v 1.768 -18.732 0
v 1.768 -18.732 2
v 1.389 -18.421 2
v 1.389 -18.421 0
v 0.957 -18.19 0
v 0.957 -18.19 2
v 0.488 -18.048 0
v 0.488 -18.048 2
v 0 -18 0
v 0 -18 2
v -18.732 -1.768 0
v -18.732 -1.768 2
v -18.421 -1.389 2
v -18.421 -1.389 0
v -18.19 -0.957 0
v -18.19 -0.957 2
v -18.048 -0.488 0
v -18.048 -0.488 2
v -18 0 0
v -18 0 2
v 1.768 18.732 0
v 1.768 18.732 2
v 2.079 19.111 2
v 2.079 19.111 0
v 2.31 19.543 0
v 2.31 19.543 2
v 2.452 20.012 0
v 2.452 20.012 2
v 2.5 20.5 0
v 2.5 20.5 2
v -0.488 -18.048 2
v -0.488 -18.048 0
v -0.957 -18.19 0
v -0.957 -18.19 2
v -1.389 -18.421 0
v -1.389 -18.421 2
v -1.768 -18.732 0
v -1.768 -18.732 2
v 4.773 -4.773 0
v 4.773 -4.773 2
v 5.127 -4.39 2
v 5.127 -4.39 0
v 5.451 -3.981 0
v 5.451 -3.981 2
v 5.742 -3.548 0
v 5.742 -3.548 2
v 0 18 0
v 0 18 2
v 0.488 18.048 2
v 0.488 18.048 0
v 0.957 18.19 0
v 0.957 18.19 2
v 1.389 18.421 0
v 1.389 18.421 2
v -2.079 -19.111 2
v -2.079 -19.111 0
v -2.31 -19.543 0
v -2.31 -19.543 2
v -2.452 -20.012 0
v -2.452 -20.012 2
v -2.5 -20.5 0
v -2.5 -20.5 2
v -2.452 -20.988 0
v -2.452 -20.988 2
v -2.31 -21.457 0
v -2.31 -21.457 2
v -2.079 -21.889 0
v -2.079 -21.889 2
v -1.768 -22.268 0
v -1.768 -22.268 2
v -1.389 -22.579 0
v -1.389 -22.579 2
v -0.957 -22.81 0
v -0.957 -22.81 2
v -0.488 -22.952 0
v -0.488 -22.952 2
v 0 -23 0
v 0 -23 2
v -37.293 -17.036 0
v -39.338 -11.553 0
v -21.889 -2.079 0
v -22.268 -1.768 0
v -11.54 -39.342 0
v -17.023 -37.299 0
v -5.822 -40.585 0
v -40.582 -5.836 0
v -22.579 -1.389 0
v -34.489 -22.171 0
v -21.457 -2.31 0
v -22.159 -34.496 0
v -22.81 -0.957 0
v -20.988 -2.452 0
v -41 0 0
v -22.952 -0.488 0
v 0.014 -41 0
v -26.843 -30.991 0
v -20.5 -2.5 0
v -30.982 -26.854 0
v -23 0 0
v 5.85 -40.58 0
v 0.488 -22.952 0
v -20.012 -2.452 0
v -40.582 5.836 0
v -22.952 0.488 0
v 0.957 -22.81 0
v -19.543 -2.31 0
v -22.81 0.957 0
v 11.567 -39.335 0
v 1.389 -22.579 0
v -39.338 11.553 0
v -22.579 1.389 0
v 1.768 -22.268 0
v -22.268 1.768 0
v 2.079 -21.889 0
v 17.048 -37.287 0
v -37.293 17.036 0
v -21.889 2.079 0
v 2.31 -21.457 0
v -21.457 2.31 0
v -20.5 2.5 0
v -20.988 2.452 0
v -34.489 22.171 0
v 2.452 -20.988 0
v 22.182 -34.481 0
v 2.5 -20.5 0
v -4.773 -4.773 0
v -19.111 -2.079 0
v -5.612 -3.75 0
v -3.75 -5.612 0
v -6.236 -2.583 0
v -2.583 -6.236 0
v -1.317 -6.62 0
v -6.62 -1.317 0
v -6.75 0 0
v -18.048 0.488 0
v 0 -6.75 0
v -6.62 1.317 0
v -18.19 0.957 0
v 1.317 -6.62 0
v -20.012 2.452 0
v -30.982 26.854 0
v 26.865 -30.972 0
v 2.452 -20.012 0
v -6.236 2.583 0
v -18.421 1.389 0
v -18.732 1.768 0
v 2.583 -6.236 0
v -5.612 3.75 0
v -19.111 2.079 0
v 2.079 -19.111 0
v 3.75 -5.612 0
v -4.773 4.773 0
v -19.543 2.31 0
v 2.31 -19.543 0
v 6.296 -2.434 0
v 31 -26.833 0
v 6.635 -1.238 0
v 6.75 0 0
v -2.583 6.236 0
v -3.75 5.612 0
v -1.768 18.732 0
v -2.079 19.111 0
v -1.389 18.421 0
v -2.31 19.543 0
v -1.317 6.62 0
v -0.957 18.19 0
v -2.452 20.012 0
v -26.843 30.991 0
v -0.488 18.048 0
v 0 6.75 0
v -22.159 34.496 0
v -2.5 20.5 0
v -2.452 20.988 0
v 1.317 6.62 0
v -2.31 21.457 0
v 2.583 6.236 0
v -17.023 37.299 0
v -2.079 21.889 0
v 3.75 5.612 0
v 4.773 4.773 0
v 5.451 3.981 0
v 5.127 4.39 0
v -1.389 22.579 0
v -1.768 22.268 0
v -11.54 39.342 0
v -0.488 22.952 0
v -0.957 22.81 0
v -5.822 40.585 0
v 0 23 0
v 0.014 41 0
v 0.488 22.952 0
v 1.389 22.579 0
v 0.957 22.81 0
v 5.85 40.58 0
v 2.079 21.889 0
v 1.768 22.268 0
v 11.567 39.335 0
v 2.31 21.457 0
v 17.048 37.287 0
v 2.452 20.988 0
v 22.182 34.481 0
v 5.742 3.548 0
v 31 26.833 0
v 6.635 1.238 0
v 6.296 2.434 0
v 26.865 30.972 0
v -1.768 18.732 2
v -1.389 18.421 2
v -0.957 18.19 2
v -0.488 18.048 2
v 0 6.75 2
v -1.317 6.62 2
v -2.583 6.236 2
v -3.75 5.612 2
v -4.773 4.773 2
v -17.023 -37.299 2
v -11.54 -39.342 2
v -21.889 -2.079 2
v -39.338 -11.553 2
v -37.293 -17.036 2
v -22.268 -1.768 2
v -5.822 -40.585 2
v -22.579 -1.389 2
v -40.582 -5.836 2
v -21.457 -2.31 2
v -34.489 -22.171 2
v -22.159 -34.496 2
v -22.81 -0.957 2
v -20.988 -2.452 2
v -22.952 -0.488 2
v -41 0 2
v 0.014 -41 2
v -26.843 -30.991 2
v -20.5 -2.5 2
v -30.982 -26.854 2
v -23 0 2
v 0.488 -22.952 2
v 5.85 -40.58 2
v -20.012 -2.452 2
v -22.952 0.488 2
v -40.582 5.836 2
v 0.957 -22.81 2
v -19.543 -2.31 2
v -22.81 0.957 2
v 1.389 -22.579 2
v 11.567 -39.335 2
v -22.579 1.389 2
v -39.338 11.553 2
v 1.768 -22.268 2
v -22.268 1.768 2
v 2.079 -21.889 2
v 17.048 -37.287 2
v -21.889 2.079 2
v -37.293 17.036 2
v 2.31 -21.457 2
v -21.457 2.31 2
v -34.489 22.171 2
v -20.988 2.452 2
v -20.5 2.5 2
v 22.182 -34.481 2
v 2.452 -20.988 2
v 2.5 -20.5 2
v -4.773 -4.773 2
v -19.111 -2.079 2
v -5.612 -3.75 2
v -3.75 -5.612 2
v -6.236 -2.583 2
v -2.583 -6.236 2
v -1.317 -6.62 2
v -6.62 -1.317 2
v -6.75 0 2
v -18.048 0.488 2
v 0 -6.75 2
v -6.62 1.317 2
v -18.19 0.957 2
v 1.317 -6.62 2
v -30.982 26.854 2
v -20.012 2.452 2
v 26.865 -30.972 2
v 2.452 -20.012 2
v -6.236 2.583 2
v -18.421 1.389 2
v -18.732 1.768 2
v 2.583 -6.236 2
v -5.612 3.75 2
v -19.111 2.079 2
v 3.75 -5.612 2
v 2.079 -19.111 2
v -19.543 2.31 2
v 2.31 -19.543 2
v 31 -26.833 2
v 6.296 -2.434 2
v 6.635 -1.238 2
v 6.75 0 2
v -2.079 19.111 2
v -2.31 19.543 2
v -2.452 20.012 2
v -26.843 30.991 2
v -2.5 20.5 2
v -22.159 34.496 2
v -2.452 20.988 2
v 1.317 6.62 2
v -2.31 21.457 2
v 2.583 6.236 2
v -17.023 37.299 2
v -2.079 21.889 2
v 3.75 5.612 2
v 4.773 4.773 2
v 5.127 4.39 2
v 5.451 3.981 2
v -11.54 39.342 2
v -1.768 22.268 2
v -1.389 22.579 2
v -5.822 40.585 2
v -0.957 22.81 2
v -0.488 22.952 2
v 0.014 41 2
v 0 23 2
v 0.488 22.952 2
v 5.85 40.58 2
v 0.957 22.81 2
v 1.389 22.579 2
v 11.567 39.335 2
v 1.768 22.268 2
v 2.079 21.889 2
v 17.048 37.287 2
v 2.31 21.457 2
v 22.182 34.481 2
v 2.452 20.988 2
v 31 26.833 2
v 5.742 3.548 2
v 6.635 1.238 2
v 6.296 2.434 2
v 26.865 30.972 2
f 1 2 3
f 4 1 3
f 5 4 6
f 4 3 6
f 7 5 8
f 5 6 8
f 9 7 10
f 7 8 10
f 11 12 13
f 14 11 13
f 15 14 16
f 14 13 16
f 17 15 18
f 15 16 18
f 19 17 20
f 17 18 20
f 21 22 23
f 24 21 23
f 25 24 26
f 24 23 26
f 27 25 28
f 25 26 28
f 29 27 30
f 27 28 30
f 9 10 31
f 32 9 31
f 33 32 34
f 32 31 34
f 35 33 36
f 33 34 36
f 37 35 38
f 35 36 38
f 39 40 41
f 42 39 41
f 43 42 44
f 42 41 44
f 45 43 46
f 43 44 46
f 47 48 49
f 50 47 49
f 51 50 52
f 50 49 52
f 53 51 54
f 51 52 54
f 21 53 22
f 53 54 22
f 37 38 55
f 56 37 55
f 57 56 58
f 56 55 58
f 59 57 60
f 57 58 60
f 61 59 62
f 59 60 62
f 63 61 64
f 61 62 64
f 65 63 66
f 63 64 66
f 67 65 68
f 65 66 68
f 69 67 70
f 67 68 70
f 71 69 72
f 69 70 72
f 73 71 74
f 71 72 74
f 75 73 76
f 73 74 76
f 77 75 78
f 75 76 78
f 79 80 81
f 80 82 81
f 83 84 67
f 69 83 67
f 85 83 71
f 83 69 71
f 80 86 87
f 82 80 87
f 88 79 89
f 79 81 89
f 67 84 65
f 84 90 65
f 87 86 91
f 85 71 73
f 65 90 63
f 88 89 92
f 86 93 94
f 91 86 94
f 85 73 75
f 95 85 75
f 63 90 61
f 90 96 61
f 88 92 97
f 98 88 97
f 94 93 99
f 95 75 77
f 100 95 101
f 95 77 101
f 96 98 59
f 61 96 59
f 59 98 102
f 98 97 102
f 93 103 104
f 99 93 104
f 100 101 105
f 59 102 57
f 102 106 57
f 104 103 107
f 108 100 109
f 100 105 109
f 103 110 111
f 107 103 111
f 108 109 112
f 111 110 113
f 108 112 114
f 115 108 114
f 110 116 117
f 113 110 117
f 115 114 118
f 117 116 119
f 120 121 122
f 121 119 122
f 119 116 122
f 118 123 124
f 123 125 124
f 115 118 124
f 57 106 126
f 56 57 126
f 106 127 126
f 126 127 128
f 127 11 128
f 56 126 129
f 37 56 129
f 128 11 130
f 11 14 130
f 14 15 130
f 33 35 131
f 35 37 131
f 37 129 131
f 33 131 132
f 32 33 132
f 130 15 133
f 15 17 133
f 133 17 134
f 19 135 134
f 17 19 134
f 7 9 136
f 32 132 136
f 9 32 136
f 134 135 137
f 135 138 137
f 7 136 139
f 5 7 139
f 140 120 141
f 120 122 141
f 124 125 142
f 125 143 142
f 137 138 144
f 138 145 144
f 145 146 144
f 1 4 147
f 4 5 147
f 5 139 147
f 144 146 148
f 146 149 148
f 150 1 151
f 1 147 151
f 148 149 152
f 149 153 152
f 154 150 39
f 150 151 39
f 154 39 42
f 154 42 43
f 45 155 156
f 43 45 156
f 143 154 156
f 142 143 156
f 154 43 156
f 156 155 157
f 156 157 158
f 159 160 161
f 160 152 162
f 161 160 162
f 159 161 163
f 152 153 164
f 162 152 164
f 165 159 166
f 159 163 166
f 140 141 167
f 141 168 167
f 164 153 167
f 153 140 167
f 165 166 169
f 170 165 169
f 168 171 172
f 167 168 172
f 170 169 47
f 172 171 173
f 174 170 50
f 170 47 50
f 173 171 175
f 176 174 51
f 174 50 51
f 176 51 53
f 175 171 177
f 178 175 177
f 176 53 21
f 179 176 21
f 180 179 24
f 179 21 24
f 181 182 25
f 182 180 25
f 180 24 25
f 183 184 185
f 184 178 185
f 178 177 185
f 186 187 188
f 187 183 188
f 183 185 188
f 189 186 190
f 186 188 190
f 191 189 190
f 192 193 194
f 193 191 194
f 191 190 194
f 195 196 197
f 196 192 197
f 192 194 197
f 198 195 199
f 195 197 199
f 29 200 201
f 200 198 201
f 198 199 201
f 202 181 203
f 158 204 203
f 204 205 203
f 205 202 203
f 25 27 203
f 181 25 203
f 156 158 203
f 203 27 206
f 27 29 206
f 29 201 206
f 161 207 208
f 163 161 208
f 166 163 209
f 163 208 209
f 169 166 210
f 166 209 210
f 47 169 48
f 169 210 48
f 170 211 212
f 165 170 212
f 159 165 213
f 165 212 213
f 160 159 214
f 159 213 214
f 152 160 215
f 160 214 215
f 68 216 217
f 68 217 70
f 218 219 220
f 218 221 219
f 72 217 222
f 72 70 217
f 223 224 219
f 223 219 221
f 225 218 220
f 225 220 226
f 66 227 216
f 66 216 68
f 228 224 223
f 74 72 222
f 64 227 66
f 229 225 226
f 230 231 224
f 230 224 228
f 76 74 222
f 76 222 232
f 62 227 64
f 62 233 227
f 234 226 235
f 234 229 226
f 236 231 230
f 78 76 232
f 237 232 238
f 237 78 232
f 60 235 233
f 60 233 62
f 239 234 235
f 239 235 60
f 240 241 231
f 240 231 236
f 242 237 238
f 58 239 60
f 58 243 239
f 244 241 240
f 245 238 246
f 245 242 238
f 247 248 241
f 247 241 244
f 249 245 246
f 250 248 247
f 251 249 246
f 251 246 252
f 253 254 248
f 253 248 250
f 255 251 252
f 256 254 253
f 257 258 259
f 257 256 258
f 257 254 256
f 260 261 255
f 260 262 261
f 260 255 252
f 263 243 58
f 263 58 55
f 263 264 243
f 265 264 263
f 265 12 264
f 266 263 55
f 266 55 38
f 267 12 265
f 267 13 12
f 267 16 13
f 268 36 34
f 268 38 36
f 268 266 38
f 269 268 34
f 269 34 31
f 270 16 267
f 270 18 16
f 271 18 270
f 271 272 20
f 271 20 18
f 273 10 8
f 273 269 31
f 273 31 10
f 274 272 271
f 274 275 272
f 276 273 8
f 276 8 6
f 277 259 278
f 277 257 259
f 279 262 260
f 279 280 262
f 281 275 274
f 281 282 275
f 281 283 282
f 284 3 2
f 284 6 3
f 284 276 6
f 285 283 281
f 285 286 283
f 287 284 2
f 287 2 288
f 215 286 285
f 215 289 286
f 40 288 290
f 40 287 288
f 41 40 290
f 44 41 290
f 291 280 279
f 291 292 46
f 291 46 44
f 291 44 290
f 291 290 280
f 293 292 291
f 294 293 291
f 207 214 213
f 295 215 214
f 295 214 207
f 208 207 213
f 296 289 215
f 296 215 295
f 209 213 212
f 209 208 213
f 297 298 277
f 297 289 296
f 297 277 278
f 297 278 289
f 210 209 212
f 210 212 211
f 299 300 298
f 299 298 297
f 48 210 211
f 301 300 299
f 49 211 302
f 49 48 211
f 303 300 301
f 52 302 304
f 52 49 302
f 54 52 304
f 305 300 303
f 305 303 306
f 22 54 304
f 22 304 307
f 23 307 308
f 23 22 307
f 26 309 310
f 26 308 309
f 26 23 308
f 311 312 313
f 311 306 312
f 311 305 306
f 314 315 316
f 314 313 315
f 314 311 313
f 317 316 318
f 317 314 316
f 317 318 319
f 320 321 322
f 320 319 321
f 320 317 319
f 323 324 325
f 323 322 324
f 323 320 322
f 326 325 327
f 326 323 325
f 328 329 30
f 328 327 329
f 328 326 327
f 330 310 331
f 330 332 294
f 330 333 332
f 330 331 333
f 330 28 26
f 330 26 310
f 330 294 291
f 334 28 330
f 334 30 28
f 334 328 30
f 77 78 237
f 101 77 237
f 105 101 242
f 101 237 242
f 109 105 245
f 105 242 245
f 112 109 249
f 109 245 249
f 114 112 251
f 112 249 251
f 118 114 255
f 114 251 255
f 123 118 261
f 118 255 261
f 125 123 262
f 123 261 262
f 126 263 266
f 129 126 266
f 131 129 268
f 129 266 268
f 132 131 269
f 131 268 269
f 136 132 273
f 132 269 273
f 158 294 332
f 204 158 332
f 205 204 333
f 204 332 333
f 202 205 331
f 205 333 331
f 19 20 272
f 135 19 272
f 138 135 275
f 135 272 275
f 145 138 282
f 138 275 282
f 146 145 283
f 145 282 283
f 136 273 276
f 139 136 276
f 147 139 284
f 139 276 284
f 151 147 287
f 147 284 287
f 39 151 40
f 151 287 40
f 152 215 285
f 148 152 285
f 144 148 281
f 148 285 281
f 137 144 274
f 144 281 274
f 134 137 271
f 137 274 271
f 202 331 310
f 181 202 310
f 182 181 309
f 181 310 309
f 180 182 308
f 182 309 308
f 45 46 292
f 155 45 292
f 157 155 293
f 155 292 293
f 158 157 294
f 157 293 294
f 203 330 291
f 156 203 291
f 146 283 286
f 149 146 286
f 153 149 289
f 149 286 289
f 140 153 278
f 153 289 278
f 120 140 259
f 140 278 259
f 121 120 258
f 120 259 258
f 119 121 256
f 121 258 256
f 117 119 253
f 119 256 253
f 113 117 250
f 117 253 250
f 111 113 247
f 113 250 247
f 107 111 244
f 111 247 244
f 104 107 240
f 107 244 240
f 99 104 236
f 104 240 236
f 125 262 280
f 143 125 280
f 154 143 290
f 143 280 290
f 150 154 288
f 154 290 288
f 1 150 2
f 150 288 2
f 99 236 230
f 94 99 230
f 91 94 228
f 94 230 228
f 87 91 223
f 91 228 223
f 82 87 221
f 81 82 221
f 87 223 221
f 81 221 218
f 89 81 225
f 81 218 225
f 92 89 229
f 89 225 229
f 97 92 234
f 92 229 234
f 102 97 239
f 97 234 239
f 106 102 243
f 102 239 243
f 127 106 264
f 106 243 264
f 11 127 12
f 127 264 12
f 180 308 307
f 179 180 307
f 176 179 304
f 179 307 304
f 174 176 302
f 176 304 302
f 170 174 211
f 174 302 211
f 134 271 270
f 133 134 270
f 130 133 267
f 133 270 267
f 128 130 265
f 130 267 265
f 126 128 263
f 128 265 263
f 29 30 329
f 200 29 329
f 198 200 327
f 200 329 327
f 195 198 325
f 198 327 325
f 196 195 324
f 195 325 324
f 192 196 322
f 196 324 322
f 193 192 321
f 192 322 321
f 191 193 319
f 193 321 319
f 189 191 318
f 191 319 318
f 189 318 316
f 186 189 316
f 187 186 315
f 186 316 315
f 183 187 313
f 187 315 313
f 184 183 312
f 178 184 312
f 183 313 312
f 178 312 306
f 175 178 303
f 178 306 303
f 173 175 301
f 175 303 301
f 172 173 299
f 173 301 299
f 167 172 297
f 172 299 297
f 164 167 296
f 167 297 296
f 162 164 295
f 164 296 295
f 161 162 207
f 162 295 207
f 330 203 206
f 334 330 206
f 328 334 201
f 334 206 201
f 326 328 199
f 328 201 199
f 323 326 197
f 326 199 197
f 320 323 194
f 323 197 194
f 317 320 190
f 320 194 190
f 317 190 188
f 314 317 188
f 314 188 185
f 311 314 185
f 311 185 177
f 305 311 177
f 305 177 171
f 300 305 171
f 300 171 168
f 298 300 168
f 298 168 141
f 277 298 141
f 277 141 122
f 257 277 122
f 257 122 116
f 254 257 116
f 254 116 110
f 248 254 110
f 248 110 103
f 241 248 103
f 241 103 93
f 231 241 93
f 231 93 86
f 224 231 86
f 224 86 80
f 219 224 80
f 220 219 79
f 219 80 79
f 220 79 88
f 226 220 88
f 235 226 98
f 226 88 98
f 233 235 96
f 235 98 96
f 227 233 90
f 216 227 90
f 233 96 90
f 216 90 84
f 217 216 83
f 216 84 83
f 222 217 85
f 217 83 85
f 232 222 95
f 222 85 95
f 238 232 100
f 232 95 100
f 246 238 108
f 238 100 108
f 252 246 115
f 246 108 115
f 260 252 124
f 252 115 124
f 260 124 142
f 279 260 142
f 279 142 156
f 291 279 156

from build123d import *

# Parameters (mm, degrees)
F0_R     = 41
F1_DEPTH = 2
F3_DEPTH = 2.001


with BuildPart() as f1:
    # F0 (on Top) → F1 (new body)
    with BuildSketch(Plane.XY):
        Circle(F0_R)
    extrude(amount=F1_DEPTH)

    # F2 (on face) → F3 (cut, through all)
    with BuildSketch(Plane.XY.offset(2)):
        with BuildLine():
            Line((-23, 0), (-20.5, 0))
            Line((-20.5, 0), (-18.732233047, 1.767766953))
            ThreePointArc((-18.732233047, 1.767766953), (-21.4567085809, 2.3096988313), (-23, 0))
        make_face()
        with BuildLine():
            Line((-18.732233047, -1.767766953), (-20.5, 0))
            Line((-20.5, 0), (-23, 0))
            ThreePointArc((-23, 0), (-21.4567085809, -2.3096988313), (-18.732233047, -1.767766953))
        make_face()
        with BuildLine():
            ThreePointArc((-18.732233047, -1.767766953), (-18.1903011687, -0.9567085809), (-18, 0))
            Line((-18, 0), (-20.5, 0))
            Line((-20.5, 0), (-18.732233047, -1.767766953))
        make_face()
        with BuildLine():
            Line((-20.5, 0), (-18, 0))
            ThreePointArc((-18, 0), (-18.1903011687, 0.9567085809), (-18.732233047, 1.767766953))
            Line((-18.732233047, 1.767766953), (-20.5, 0))
        make_face()
        with BuildLine():
            Line((-1.767766953, 18.732233047), (0, 20.5))
            Line((0, 20.5), (0, 23))
            ThreePointArc((0, 23), (-2.3096988313, 21.4567085809), (-1.767766953, 18.732233047))
        make_face()
        with BuildLine():
            ThreePointArc((-1.767766953, 18.732233047), (-0.9567085809, 18.1903011687), (0, 18))
            Line((0, 18), (0, 20.5))
            Line((0, 20.5), (-1.767766953, 18.732233047))
        make_face()
        with BuildLine():
            Line((0, 20.5), (0, 18))
            ThreePointArc((0, 18), (0.9567085809, 18.1903011687), (1.767766953, 18.732233047))
            Line((1.767766953, 18.732233047), (0, 20.5))
        make_face()
        with BuildLine():
            Line((0, 23), (0, 20.5))
            Line((0, 20.5), (1.767766953, 18.732233047))
            ThreePointArc((1.767766953, 18.732233047), (2.3096988313, 19.5432914191), (2.5, 20.5))
            ThreePointArc((2.5, 20.5), (1.767766953, 22.267766953), (0, 23))
        make_face()
        with BuildLine():
            Line((-4.772970773, 4.772970773), (0, 0))
            Line((0, 0), (0, 6.75))
            ThreePointArc((0, 6.75), (-2.5831131685, 6.2361868445), (-4.772970773, 4.772970773))
        make_face()
        with BuildLine():
            Line((-6.75, 0), (0, 0))
            Line((0, 0), (-4.772970773, 4.772970773))
            ThreePointArc((-4.772970773, 4.772970773), (-6.2361868445, 2.5831131685), (-6.75, 0))
        make_face()
        with BuildLine():
            Line((-4.772970773, -4.772970773), (0, 0))
            Line((0, 0), (-6.75, 0))
            ThreePointArc((-6.75, 0), (-6.2361868445, -2.5831131685), (-4.772970773, -4.772970773))
        make_face()
        with BuildLine():
            Line((0, -6.75), (0, 0))
            Line((0, 0), (-4.772970773, -4.772970773))
            ThreePointArc((-4.772970773, -4.772970773), (-2.5831131685, -6.2361868445), (0, -6.75))
        make_face()
        with BuildLine():
            Line((4.772970773, -4.772970773), (0, 0))
            Line((0, 0), (0, -6.75))
            ThreePointArc((0, -6.75), (2.5831131685, -6.2361868445), (4.772970773, -4.772970773))
        make_face()
        with BuildLine():
            Line((6.75, 0), (0, 0))
            Line((0, 0), (5.7423592933, -3.5479303469))
            ThreePointArc((5.7423592933, -3.5479303469), (6.4932051111, -1.8441223888), (6.75, 0))
        make_face()
        with BuildLine():
            Line((5.7423592933, 3.5479303469), (0, 0))
            Line((0, 0), (6.75, 0))
            ThreePointArc((6.75, 0), (6.4932051111, 1.8441223888), (5.7423592933, 3.5479303469))
        make_face()
        with BuildLine():
            Line((0, 6.75), (0, 0))
            Line((0, 0), (4.772970773, 4.772970773))
            ThreePointArc((4.772970773, 4.772970773), (2.5831131685, 6.2361868445), (0, 6.75))
        make_face()
        with BuildLine():
            Line((5.7423592933, -3.5479303469), (0, 0))
            Line((0, 0), (4.772970773, -4.772970773))
            ThreePointArc((4.772970773, -4.772970773), (5.2932242171, -4.1885889495), (5.7423592933, -3.5479303469))
        make_face()
        with BuildLine():
            Line((4.772970773, 4.772970773), (0, 0))
            Line((0, 0), (5.7423592933, 3.5479303469))
            ThreePointArc((5.7423592933, 3.5479303469), (5.2932242171, 4.1885889495), (4.772970773, 4.772970773))
        make_face()
        with BuildLine():
            Line((0, -23), (0, -20.5))
            Line((0, -20.5), (-1.767766953, -18.732233047))
            ThreePointArc((-1.767766953, -18.732233047), (-2.3096988313, -21.4567085809), (0, -23))
        make_face()
        with BuildLine():
            ThreePointArc((1.767766953, -18.732233047), (0.9567085809, -18.1903011687), (0, -18))
            Line((0, -18), (0, -20.5))
            Line((0, -20.5), (1.767766953, -18.732233047))
        make_face()
        with BuildLine():
            Line((0, -20.5), (0, -18))
            ThreePointArc((0, -18), (-0.9567085809, -18.1903011687), (-1.767766953, -18.732233047))
            Line((-1.767766953, -18.732233047), (0, -20.5))
        make_face()
        with BuildLine():
            Line((1.767766953, -18.732233047), (0, -20.5))
            Line((0, -20.5), (0, -23))
            ThreePointArc((0, -23), (1.767766953, -22.267766953), (2.5, -20.5))
            ThreePointArc((2.5, -20.5), (2.3096988313, -19.5432914191), (1.767766953, -18.732233047))
        make_face()
        with BuildLine():
            Line((41, 0), (31, 0))
            Line((31, 0), (31, -26.83281573))
            ThreePointArc((31, -26.83281573), (38.4187454246, -14.3178210633), (41, 0))
        make_face()
        with BuildLine():
            Line((31, 26.83281573), (31, 0))
            Line((31, 0), (41, 0))
            ThreePointArc((41, 0), (38.4187454246, 14.3178210633), (31, 26.83281573))
        make_face()
    extrude(amount=-F3_DEPTH, mode=Mode.SUBTRACT)


solid = f1.part
